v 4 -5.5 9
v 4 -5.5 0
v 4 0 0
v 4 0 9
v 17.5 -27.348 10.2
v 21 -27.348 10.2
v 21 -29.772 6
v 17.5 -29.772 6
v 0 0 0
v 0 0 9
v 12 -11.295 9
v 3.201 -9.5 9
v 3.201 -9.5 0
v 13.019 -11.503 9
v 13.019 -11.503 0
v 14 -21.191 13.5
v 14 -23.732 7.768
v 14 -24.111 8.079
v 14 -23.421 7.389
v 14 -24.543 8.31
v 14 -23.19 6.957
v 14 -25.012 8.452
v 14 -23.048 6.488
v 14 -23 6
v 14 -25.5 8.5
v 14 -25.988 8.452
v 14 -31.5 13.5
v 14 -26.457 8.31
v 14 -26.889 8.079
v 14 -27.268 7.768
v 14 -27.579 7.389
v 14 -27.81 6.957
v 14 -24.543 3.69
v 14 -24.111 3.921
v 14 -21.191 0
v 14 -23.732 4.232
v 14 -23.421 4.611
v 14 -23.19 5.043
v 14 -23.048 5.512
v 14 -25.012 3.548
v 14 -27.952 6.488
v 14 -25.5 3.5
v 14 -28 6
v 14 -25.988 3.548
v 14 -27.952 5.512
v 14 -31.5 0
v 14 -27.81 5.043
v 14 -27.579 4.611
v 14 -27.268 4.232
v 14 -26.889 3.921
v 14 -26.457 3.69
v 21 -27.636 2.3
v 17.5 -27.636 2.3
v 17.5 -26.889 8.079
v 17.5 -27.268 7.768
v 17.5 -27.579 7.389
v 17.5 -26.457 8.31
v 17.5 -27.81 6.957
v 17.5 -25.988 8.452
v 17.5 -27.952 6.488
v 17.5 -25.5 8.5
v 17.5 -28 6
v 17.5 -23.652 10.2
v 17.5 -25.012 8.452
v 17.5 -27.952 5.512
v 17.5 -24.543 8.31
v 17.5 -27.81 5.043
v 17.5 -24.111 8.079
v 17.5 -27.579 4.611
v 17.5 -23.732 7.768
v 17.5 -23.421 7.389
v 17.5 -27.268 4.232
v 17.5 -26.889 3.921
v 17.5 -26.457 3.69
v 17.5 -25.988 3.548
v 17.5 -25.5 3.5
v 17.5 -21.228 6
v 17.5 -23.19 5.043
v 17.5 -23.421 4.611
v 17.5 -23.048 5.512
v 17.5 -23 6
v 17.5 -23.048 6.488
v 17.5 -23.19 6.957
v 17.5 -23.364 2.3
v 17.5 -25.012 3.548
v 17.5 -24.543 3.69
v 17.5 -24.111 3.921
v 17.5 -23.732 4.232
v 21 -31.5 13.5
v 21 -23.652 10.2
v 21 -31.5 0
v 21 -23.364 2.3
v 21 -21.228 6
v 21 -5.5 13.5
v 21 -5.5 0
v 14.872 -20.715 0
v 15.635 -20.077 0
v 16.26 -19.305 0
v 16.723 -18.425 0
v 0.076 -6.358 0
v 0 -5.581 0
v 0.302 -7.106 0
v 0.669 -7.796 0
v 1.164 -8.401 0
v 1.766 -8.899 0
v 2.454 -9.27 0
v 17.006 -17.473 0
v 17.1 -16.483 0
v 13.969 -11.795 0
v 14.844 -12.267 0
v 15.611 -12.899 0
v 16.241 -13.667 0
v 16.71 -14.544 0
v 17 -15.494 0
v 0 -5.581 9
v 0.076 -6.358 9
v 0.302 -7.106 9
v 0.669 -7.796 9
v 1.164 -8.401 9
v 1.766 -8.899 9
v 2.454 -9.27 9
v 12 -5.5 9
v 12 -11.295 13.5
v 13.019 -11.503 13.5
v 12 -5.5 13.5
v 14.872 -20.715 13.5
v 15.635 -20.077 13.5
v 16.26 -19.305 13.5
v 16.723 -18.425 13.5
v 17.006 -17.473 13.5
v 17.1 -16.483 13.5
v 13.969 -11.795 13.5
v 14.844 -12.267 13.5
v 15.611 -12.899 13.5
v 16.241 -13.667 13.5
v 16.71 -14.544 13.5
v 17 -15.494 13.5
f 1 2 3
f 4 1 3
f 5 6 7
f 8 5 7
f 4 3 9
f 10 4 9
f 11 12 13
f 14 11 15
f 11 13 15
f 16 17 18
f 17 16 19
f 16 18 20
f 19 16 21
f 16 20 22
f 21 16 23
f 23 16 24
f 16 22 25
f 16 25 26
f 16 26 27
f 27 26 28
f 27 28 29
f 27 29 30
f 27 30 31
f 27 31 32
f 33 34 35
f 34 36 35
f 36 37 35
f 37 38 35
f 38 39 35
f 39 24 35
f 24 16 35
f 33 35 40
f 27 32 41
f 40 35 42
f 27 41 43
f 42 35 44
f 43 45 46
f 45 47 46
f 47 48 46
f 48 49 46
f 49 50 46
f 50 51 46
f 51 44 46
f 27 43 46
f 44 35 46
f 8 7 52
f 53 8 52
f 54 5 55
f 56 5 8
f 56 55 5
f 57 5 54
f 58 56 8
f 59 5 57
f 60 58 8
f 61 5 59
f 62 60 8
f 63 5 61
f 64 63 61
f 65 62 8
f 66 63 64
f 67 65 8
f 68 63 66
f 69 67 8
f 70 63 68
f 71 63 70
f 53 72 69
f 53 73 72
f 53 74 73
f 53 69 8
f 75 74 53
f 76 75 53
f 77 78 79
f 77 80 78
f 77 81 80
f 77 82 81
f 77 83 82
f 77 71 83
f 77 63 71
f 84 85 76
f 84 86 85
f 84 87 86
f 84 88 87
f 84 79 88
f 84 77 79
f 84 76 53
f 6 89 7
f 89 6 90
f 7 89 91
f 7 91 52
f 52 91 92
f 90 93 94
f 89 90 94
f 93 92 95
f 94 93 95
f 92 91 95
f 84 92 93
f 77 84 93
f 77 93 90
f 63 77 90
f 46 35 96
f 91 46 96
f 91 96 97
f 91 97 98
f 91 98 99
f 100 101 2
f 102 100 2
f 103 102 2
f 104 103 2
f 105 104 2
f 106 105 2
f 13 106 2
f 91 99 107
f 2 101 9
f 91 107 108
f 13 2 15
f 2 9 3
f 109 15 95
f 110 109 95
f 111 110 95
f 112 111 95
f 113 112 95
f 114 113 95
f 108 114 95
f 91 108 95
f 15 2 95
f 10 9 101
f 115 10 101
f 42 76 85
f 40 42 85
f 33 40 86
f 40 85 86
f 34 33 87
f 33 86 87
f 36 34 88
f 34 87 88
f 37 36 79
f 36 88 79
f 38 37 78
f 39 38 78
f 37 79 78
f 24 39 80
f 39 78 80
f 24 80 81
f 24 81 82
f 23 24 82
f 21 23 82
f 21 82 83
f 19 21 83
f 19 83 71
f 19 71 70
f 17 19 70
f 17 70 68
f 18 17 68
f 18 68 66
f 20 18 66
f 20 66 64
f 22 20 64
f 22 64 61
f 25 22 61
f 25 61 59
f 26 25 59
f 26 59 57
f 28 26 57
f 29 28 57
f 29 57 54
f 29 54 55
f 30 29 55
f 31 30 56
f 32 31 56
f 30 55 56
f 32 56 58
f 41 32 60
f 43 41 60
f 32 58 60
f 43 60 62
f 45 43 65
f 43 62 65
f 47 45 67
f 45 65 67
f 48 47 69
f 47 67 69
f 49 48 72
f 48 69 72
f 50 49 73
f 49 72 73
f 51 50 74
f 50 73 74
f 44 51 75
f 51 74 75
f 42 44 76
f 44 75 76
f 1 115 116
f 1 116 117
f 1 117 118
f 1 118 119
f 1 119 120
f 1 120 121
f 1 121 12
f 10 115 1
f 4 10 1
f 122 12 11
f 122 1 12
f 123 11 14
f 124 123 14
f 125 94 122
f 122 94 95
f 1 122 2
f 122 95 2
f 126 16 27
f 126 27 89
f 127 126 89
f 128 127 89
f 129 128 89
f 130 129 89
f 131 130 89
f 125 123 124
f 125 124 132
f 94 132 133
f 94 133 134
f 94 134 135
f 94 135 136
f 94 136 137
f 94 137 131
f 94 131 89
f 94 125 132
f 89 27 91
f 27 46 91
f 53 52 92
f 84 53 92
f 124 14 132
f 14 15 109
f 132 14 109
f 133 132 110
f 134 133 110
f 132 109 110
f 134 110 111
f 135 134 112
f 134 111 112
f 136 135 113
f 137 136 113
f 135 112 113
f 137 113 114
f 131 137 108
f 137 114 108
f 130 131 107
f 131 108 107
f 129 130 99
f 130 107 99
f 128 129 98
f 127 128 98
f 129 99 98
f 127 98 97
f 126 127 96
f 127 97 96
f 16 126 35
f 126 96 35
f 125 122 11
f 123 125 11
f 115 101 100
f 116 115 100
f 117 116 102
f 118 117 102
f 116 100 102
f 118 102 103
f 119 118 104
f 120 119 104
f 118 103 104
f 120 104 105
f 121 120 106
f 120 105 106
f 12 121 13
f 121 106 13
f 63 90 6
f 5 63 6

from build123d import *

# Parameters (mm, degrees)
BOSS_EXTRUDE1_DEPTH = 9
SKETCH2_R           = 2.5
CUT_EXTRUDE1_DEPTH  = 39.913365313
BOSS_EXTRUDE2_DEPTH = 4.5
CUT_EXTRUDE2_DEPTH  = 3.5


with BuildPart() as part:
    # Sketch1 → Boss-Extrude1 (new body)
    with BuildSketch(Plane.XY):
        with BuildLine():
            Line((0, 0), (0, -5.580710666))
            ThreePointArc((0, -5.580710666), (0.901780583, -8.110737631), (3.200518222, -9.5))
            Line((3.200518222, -9.5), (13.019339267, -11.502906099))
            ThreePointArc((13.019339267, -11.502906099), (17.074073947, -15.986411077), (14, -21.191481642))
            Line((14, -21.191481642), (14, -31.5))
            Line((14, -31.5), (21, -31.5))
            Line((21, -31.5), (21, -5.5))
            Line((21, -5.5), (4, -5.5))
            Line((4, -5.5), (4, 0))
            Line((4, 0), (0, 0))
        make_face()
    extrude(amount=BOSS_EXTRUDE1_DEPTH)

    # Sketch2 → Cut-Extrude1 (cut, through all)
    with BuildSketch(Plane(origin=(21, 0, 0), x_dir=(0, 0, -1), z_dir=(1, 0, 0))):
        with Locations((-6, -25.5)):
            Circle(SKETCH2_R)
    extrude(amount=-CUT_EXTRUDE1_DEPTH, mode=Mode.SUBTRACT)

    # Sketch3 → Boss-Extrude2 (add)
    with BuildSketch(Plane.XY.offset(9)):
        with BuildLine():
            Line((12, -5.5), (12, -11.294974737))
            Line((12, -11.294974737), (13.019339267, -11.502906099))
            ThreePointArc((13.019339267, -11.502906099), (17.074073947, -15.986411077), (14, -21.191481642))
            Line((14, -21.191481642), (14, -31.5))
            Line((14, -31.5), (21, -31.5))
            Line((21, -31.5), (21, -5.5))
            Line((21, -5.5), (12, -5.5))
        make_face()
    extrude(amount=BOSS_EXTRUDE2_DEPTH)

    # Sketch4 → Cut-Extrude2 (cut)
    with BuildSketch(Plane(origin=(21, 0, 0), x_dir=(0, 0, -1), z_dir=(1, 0, 0))):
        Polygon((-10.2, -23.652479139), (-10.2, -27.347520861), (-6, -29.772391992), (-2.3, -27.636195996), (-2.3, -23.363804004), (-6, -21.227608008), align=None)
    extrude(amount=-CUT_EXTRUDE2_DEPTH, mode=Mode.SUBTRACT)


solid = part.part
